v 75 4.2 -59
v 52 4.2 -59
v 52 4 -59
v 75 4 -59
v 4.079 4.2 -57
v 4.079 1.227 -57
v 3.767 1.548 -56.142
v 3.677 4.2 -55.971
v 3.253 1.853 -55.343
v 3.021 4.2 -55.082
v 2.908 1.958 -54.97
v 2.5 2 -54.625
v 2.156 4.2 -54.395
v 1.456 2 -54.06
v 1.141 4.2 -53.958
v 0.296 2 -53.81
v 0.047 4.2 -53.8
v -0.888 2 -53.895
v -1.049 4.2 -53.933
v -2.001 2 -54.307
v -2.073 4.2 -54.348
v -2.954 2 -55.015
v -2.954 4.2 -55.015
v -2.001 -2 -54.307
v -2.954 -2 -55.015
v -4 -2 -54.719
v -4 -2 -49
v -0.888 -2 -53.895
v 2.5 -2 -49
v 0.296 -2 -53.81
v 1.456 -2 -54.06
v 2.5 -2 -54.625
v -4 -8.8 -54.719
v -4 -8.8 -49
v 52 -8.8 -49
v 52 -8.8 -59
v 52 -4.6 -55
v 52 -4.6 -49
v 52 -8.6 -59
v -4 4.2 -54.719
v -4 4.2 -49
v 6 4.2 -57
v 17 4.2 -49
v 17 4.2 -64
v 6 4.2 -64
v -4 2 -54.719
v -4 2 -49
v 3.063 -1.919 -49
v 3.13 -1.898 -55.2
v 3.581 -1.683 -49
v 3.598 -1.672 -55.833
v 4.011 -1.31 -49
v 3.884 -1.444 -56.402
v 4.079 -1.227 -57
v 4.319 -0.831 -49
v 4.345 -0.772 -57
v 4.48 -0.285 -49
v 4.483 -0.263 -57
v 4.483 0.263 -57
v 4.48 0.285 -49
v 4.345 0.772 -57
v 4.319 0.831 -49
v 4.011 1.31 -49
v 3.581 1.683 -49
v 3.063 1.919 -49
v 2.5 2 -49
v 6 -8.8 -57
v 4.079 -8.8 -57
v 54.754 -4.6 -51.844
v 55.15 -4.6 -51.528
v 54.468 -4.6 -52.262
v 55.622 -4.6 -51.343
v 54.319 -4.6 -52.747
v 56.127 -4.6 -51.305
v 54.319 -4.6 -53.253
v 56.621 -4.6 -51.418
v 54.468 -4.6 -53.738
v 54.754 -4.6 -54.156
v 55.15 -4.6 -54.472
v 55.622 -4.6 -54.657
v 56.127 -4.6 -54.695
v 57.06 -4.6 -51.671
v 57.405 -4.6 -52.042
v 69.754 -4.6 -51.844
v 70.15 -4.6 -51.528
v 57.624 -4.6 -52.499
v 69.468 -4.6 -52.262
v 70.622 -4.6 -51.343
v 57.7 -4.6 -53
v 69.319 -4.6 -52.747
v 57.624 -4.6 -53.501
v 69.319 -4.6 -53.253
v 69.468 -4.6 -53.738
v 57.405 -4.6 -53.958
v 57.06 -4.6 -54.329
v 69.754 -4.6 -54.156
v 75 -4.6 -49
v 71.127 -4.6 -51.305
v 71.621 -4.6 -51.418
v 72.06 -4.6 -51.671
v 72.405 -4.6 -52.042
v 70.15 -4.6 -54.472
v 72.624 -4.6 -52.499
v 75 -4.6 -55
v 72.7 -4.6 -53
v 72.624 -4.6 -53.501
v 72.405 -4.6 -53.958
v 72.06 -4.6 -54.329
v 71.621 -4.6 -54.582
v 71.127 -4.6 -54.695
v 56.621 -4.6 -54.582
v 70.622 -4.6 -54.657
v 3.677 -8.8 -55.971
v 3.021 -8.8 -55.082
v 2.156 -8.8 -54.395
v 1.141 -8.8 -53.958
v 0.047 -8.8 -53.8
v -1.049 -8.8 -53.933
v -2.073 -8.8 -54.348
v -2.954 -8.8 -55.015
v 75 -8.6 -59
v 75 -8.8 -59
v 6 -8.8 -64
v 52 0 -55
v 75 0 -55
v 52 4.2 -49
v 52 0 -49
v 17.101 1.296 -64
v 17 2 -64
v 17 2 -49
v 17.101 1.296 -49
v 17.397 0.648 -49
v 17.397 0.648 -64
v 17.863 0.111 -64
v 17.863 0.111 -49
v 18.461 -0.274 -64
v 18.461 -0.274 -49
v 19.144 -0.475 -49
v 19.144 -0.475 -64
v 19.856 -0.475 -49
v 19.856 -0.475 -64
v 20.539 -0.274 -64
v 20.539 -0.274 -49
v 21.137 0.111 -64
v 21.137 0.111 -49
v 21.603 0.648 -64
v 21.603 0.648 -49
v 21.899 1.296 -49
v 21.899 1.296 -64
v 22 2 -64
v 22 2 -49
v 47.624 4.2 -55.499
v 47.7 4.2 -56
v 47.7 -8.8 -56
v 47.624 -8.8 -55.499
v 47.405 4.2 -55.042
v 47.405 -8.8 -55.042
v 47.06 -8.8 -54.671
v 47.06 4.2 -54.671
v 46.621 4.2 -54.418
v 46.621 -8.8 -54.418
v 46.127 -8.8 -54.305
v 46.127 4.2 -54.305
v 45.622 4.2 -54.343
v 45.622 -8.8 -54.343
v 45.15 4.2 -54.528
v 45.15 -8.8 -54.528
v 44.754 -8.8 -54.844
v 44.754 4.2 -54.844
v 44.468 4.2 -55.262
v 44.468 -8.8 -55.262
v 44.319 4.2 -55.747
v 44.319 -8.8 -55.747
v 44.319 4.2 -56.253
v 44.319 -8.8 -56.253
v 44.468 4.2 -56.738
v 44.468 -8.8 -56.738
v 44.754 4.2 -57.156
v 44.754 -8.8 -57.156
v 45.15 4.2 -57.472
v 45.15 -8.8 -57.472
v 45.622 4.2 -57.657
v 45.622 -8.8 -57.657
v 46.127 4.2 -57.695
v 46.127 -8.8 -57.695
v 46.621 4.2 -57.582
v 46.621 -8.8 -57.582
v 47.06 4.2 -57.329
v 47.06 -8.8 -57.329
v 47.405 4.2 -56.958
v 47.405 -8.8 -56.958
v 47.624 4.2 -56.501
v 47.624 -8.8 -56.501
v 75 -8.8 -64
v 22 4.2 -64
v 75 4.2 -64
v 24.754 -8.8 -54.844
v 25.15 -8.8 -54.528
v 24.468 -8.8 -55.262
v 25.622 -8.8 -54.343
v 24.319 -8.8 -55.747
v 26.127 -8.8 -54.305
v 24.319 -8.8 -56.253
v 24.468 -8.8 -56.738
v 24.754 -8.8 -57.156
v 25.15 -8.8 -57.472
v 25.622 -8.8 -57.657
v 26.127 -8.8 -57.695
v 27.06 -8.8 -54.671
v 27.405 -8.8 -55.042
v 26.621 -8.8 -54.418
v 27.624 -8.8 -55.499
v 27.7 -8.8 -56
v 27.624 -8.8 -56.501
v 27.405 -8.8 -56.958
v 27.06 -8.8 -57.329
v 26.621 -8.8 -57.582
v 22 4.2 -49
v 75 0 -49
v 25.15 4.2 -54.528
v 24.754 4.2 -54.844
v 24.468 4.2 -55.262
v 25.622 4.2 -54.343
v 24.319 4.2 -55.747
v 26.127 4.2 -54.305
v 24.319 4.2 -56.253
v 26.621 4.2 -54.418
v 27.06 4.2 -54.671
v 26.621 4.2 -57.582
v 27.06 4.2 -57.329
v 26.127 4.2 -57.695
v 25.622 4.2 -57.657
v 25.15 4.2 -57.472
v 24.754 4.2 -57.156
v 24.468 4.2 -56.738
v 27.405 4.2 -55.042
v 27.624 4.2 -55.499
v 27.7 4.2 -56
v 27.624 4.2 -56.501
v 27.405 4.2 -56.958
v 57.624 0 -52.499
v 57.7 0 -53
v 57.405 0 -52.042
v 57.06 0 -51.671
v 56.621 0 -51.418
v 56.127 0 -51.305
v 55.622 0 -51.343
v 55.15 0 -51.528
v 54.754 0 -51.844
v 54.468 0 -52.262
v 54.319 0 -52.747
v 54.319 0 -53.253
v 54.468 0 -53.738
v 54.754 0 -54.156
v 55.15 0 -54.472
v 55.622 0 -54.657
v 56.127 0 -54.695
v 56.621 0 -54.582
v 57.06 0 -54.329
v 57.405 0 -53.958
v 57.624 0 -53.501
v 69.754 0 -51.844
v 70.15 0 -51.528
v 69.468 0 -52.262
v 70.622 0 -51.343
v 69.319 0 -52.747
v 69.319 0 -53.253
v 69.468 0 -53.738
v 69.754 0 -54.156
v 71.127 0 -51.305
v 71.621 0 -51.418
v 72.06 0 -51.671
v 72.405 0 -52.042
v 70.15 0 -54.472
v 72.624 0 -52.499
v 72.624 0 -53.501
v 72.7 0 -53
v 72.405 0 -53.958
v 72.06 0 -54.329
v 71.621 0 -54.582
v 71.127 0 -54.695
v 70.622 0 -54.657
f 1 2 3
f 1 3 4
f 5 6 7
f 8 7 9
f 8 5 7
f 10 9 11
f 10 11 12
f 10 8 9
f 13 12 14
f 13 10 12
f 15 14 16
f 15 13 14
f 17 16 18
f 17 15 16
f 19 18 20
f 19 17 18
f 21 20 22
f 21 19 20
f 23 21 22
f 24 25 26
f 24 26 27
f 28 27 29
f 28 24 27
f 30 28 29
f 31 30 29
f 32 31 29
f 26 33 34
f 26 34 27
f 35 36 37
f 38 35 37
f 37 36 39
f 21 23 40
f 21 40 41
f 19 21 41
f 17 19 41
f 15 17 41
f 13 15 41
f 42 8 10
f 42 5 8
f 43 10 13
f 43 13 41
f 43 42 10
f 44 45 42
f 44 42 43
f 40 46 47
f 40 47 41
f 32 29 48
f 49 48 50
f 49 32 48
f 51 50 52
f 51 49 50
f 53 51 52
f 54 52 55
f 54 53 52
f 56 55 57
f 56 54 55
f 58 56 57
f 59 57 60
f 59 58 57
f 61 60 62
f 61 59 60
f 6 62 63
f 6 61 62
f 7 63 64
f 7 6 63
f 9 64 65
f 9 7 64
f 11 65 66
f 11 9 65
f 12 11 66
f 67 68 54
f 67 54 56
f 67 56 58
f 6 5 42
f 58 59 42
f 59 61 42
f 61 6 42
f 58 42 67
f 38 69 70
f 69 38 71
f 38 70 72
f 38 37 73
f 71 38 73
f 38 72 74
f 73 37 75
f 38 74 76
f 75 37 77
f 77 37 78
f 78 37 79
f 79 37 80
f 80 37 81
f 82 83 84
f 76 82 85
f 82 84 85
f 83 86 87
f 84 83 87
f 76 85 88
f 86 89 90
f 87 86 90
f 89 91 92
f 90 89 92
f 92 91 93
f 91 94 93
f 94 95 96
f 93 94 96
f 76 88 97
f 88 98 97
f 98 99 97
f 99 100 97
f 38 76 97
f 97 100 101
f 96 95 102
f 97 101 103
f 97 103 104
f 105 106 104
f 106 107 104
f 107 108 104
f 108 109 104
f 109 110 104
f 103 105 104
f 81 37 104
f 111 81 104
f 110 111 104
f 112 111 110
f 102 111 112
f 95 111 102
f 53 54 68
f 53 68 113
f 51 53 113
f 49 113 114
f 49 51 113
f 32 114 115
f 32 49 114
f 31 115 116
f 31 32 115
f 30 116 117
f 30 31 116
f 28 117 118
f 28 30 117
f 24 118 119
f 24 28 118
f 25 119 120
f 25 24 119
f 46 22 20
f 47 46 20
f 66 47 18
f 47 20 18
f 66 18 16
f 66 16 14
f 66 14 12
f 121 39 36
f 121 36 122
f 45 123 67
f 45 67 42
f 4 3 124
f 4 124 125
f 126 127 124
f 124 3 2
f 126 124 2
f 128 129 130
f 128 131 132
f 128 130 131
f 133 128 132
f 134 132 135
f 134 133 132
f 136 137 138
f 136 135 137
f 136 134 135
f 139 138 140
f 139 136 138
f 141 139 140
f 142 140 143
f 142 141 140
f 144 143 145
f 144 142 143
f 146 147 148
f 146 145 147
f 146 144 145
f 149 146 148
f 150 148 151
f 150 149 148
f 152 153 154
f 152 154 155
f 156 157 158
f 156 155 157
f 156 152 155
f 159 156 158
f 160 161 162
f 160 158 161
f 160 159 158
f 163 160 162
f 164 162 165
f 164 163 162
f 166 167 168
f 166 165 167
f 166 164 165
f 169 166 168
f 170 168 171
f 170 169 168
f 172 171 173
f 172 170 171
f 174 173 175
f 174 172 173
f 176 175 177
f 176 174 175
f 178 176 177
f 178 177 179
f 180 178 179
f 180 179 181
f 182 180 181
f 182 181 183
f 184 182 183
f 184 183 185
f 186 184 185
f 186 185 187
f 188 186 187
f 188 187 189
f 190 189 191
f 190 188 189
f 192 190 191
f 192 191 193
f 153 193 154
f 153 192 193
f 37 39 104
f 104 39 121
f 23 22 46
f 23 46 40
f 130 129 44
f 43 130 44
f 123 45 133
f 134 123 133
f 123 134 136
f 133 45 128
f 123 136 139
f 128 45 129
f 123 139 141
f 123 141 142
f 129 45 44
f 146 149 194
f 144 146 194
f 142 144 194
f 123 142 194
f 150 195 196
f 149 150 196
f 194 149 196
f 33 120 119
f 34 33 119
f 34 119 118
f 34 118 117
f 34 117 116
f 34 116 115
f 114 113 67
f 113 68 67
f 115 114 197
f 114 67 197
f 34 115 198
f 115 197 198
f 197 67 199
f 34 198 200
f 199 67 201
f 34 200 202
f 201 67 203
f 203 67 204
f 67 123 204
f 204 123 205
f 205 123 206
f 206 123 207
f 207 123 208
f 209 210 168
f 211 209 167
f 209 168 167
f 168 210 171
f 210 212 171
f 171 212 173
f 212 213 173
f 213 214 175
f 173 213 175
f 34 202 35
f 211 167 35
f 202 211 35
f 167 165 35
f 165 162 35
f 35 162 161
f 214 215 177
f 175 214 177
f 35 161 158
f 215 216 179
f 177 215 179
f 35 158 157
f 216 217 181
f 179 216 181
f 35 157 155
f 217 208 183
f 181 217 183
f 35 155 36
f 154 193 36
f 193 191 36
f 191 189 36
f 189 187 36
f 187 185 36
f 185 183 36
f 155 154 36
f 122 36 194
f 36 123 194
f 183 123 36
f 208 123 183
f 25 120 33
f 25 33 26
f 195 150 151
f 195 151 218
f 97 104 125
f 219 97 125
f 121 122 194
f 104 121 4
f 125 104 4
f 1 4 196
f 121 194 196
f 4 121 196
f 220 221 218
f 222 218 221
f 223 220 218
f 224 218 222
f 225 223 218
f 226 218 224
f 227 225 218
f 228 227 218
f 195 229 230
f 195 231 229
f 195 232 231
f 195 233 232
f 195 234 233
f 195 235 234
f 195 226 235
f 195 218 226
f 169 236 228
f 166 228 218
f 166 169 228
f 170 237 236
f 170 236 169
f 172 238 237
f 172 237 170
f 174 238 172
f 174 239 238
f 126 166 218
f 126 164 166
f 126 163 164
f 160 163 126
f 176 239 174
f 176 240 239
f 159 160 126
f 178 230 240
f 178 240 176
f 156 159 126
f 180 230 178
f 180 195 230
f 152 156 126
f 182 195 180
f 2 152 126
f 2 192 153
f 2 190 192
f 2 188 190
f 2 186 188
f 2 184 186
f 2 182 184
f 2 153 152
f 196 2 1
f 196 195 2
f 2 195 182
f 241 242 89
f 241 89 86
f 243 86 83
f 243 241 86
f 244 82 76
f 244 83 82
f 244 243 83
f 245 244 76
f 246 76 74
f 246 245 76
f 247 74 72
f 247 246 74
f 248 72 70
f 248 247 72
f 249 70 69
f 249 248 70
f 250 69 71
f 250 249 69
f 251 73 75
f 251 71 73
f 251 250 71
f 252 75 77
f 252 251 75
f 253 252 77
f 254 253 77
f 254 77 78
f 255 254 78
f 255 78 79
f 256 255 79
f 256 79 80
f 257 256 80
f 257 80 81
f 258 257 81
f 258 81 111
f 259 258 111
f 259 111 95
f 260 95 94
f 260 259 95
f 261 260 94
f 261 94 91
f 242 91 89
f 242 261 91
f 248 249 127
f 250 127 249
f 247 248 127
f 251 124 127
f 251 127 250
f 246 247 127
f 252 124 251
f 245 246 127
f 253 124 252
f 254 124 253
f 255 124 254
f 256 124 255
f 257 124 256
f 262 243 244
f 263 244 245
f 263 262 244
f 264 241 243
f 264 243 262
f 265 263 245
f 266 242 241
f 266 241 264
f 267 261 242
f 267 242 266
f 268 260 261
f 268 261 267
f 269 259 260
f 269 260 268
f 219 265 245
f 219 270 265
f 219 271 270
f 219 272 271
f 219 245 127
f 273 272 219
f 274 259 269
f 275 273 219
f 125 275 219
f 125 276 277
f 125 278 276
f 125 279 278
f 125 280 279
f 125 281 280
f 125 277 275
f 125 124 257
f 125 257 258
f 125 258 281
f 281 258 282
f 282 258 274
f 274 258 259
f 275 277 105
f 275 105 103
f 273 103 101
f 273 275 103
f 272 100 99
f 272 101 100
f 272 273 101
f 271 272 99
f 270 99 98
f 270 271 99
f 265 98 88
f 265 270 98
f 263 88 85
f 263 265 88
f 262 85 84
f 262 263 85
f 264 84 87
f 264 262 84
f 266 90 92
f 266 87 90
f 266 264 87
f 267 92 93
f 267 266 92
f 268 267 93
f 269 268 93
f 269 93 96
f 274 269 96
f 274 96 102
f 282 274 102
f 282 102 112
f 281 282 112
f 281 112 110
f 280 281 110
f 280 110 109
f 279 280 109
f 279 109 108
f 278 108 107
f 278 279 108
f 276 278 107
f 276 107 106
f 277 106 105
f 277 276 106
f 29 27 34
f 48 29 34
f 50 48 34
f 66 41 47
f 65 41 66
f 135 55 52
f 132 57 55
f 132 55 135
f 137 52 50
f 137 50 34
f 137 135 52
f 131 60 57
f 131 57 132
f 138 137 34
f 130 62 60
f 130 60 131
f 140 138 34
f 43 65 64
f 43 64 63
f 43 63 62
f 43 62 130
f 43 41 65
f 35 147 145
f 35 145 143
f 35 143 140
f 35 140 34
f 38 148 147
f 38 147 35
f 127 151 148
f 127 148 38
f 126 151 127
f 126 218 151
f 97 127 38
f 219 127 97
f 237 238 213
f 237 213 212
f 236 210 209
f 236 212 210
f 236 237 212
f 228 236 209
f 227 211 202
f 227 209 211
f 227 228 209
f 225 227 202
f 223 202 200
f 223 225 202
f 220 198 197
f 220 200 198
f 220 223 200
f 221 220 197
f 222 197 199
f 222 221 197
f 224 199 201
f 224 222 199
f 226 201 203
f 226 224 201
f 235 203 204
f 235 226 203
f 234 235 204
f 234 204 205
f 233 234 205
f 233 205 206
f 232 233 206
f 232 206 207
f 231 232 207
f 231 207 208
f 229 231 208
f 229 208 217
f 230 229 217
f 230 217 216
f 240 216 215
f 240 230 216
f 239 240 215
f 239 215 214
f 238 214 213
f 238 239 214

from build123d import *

# Parameters (mm, degrees)
BOX001027045163_W      = 10
BOX001027045163_H      = 4
BOX001027045163_DEPTH  = 60
CYLINDER211_R          = 2
CYLINDER211_DEPTH      = 74
BOX001027045160_W      = 5
BOX001027045160_H      = 10
BOX001027045160_DEPTH  = 21
CYLINDER209_R          = 2.5
CYLINDER209_DEPTH      = 30
CYLINDER205_R          = 1.7
CYLINDER205_DEPTH      = 20
CYLINDER205_ROLL_ANGLE = 90
CYLINDER204_R          = 1.7
CYLINDER204_DEPTH      = 20
CYLINDER204_ROLL_ANGLE = 90
CYLINDER199_R          = 1.7
CYLINDER199_DEPTH      = 20
CYLINDER199_ROLL_ANGLE = 90
CYLINDER198_R          = 1.7
CYLINDER198_DEPTH      = 20
CYLINDER198_ROLL_ANGLE = 90
BOX001027045153_W      = 29
BOX001027045153_H      = 10
BOX001027045153_DEPTH  = 26
BOX001027045151_W      = 41
BOX001027045151_H      = 7
BOX001027045151_DEPTH  = 43
BOX001027045152_W      = 25
BOX001027045152_H      = 6
BOX001027045152_DEPTH  = 43
CYLINDER197_R          = 4.2
CYLINDER197_DEPTH      = 18
CYLINDER197_ROLL_ANGLE = 90
BOX001027045150_W      = 20
BOX001027045150_H      = 18
BOX001027045150_DEPTH  = 15
BOX001027045149_W      = 79
BOX001027045149_H      = 13
BOX001027045149_DEPTH  = 15
CHAMFER017_SIZE        = 2
CHAMFER026_SIZE        = 4
CHAMFER027_SIZE        = 4


with BuildPart() as cube211:
    # Box001027045163 → Box001027045163 (new body)
    with BuildSketch(Plane(origin=(-10, -2, -57), x_dir=(1, 0, 0), z_dir=(0, 0, 1))):
        with Locations((5, 2)):
            Rectangle(BOX001027045163_W, BOX001027045163_H)
    extrude(amount=BOX001027045163_DEPTH)


with BuildPart() as fusion112110:
    # Cylinder211 → Cylinder211 (new body)
    with BuildSketch(Plane.XY.offset(-62)):
        Circle(CYLINDER211_R)
    extrude(amount=CYLINDER211_DEPTH)

    # Fusion112110: union Cube211
    add(cube211.part)


with BuildPart() as fusion112110_1:
    # Fusion112110 placement: moved
    add(fusion112110.part.moved(Location((2.5, 0, 0))))


with BuildPart() as cube208:
    # Box001027045160 → Box001027045160 (new body)
    with BuildSketch(Plane(origin=(17, 2, -68), x_dir=(1, 0, 0), z_dir=(0, 0, 1))):
        with Locations((2.5, 5)):
            Rectangle(BOX001027045160_W, BOX001027045160_H)
    extrude(amount=BOX001027045160_DEPTH)


with BuildPart() as fusion112106:
    # Cylinder209 → Cylinder209 (new body)
    with BuildSketch(Plane(origin=(19.5, 2, -70), x_dir=(1, 0, 0), z_dir=(0, 0, 1))):
        Circle(CYLINDER209_R)
    extrude(amount=CYLINDER209_DEPTH)

    # Fusion112106: union Cube208
    add(cube208.part)


with BuildPart() as cylinder249:
    # Cylinder205 → Cylinder205 (new body)
    with BuildSketch(Plane.XY):
        Circle(CYLINDER205_R)
    extrude(amount=CYLINDER205_DEPTH)


with BuildPart() as cylinder249_1:
    # Cylinder205 roll: moved
    add(cylinder249.part.rotate(Axis((0, 0, 0), (1, 0, 0)), CYLINDER205_ROLL_ANGLE))


with BuildPart() as cylinder249_2:
    # Cylinder205 placement: moved
    add(cylinder249_1.part.moved(Location((46, 8, -54))))


with BuildPart() as fusion112103:
    # Cylinder204 → Cylinder204 (new body)
    with BuildSketch(Plane.XY):
        Circle(CYLINDER204_R)
    extrude(amount=CYLINDER204_DEPTH)


with BuildPart() as fusion112103_1:
    # Cylinder204 roll: moved
    add(fusion112103.part.rotate(Axis((0, 0, 0), (1, 0, 0)), CYLINDER204_ROLL_ANGLE))


with BuildPart() as fusion112103_2:
    # Cylinder204 placement: moved
    add(fusion112103_1.part.moved(Location((26, 8, -54))))

    # Fusion112103: union Cylinder249
    add(cylinder249_2.part)


with BuildPart() as fusion112103_3:
    # Fusion112103 placement: moved
    add(fusion112103_2.part.moved(Location((0, 0, -2))))


with BuildPart() as cylinder243:
    # Cylinder199 → Cylinder199 (new body)
    with BuildSketch(Plane.XY):
        Circle(CYLINDER199_R)
    extrude(amount=CYLINDER199_DEPTH)


with BuildPart() as cylinder243_1:
    # Cylinder199 roll: moved
    add(cylinder243.part.rotate(Axis((0, 0, 0), (1, 0, 0)), CYLINDER199_ROLL_ANGLE))


with BuildPart() as cylinder243_2:
    # Cylinder199 placement: moved
    add(cylinder243_1.part.moved(Location((71, 8, -54))))


with BuildPart() as fusion112100:
    # Cylinder198 → Cylinder198 (new body)
    with BuildSketch(Plane.XY):
        Circle(CYLINDER198_R)
    extrude(amount=CYLINDER198_DEPTH)


with BuildPart() as fusion112100_1:
    # Cylinder198 roll: moved
    add(fusion112100.part.rotate(Axis((0, 0, 0), (1, 0, 0)), CYLINDER198_ROLL_ANGLE))


with BuildPart() as fusion112100_2:
    # Cylinder198 placement: moved
    add(fusion112100_1.part.moved(Location((56, 8, -54))))

    # Fusion112100: union Cylinder243
    add(cylinder243_2.part)


with BuildPart() as fusion112100_3:
    # Fusion112100 placement: moved
    add(fusion112100_2.part.moved(Location((0, 0, 1))))


with BuildPart() as cube201:
    # Box001027045153 → Box001027045153 (new body)
    with BuildSketch(Plane(origin=(23, -2, -64), x_dir=(1, 0, 0), z_dir=(0, 0, 1))):
        with Locations((14.5, 5)):
            Rectangle(BOX001027045153_W, BOX001027045153_H)
    extrude(amount=BOX001027045153_DEPTH)


with BuildPart() as cut174:
    # Box001027045151 → Box001027045151 (new body)
    with BuildSketch(Plane(origin=(35, 0, -59), x_dir=(1, 0, 0), z_dir=(0, 0, 1))):
        with Locations((20.5, 3.5)):
            Rectangle(BOX001027045151_W, BOX001027045151_H)
    extrude(amount=BOX001027045151_DEPTH)

    # Cut174: cut Cube201
    add(cube201.part, mode=Mode.SUBTRACT)


with BuildPart() as fusion112099:
    # Box001027045152 → Box001027045152 (new body)
    with BuildSketch(Plane(origin=(52, -10.6, -59), x_dir=(1, 0, 0), z_dir=(0, 0, 1))):
        with Locations((12.5, 3)):
            Rectangle(BOX001027045152_W, BOX001027045152_H)
    extrude(amount=BOX001027045152_DEPTH)

    # Fusion112099: union Cut174
    add(cut174.part)


with BuildPart() as rocker_cut001:
    # Cylinder197 → Cylinder197 (new body)
    with BuildSketch(Plane.XY):
        Circle(CYLINDER197_R)
    extrude(amount=CYLINDER197_DEPTH)


with BuildPart() as rocker_cut001_1:
    # Cylinder197 roll: moved
    add(rocker_cut001.part.rotate(Axis((0, 0, 0), (1, 0, 0)), CYLINDER197_ROLL_ANGLE))


with BuildPart() as rocker_cut001_2:
    # Cylinder197 placement: moved
    add(rocker_cut001_1.part.moved(Location((0, 7, -58))))


with BuildPart() as fusion112098:
    # Box001027045150 → Box001027045150 (new body)
    with BuildSketch(Plane(origin=(-14, -11.8, -72), x_dir=(1, 0, 0), z_dir=(0, 0, 1))):
        with Locations((10, 9)):
            Rectangle(BOX001027045150_W, BOX001027045150_H)
    extrude(amount=BOX001027045150_DEPTH)

    # Fusion112098: union rocker-cut001
    add(rocker_cut001_2.part)


with BuildPart() as base_and_mount:
    # Box001027045149 → Box001027045149 (new body)
    with BuildSketch(Plane(origin=(-4, -8.8, -64), x_dir=(1, 0, 0), z_dir=(0, 0, 1))):
        with Locations((39.5, 6.5)):
            Rectangle(BOX001027045149_W, BOX001027045149_H)
    extrude(amount=BOX001027045149_DEPTH)

    # Cut173: cut Fusion112098
    add(fusion112098.part, mode=Mode.SUBTRACT)

    # Chamfer017
    chamfer017_edges = [base_and_mount.edges().sort_by_distance(p)[0] for p in [
        (-4, -2.3, -56.719375),
    ]]
    chamfer(chamfer017_edges, length=CHAMFER017_SIZE)

    # Cut175: cut Fusion112099
    add(fusion112099.part, mode=Mode.SUBTRACT)

    # Cut176: cut Fusion112100
    add(fusion112100_3.part, mode=Mode.SUBTRACT)

    # Cut179: cut Fusion112103
    add(fusion112103_3.part, mode=Mode.SUBTRACT)

    # Cut184: cut Fusion112106
    add(fusion112106.part, mode=Mode.SUBTRACT)

    # Cut189: cut Fusion112110
    add(fusion112110_1.part, mode=Mode.SUBTRACT)

    # Chamfer026
    chamfer026_edges = [base_and_mount.edges().sort_by_distance(p)[0] for p in [
        (63.5, 0, -59),
    ]]
    chamfer(chamfer026_edges, length=CHAMFER026_SIZE)

    # Chamfer027
    chamfer027_edges = [base_and_mount.edges().sort_by_distance(p)[0] for p in [
        (63.5, -4.6, -59),
    ]]
    chamfer(chamfer027_edges, length=CHAMFER027_SIZE)


solid = base_and_mount.part
